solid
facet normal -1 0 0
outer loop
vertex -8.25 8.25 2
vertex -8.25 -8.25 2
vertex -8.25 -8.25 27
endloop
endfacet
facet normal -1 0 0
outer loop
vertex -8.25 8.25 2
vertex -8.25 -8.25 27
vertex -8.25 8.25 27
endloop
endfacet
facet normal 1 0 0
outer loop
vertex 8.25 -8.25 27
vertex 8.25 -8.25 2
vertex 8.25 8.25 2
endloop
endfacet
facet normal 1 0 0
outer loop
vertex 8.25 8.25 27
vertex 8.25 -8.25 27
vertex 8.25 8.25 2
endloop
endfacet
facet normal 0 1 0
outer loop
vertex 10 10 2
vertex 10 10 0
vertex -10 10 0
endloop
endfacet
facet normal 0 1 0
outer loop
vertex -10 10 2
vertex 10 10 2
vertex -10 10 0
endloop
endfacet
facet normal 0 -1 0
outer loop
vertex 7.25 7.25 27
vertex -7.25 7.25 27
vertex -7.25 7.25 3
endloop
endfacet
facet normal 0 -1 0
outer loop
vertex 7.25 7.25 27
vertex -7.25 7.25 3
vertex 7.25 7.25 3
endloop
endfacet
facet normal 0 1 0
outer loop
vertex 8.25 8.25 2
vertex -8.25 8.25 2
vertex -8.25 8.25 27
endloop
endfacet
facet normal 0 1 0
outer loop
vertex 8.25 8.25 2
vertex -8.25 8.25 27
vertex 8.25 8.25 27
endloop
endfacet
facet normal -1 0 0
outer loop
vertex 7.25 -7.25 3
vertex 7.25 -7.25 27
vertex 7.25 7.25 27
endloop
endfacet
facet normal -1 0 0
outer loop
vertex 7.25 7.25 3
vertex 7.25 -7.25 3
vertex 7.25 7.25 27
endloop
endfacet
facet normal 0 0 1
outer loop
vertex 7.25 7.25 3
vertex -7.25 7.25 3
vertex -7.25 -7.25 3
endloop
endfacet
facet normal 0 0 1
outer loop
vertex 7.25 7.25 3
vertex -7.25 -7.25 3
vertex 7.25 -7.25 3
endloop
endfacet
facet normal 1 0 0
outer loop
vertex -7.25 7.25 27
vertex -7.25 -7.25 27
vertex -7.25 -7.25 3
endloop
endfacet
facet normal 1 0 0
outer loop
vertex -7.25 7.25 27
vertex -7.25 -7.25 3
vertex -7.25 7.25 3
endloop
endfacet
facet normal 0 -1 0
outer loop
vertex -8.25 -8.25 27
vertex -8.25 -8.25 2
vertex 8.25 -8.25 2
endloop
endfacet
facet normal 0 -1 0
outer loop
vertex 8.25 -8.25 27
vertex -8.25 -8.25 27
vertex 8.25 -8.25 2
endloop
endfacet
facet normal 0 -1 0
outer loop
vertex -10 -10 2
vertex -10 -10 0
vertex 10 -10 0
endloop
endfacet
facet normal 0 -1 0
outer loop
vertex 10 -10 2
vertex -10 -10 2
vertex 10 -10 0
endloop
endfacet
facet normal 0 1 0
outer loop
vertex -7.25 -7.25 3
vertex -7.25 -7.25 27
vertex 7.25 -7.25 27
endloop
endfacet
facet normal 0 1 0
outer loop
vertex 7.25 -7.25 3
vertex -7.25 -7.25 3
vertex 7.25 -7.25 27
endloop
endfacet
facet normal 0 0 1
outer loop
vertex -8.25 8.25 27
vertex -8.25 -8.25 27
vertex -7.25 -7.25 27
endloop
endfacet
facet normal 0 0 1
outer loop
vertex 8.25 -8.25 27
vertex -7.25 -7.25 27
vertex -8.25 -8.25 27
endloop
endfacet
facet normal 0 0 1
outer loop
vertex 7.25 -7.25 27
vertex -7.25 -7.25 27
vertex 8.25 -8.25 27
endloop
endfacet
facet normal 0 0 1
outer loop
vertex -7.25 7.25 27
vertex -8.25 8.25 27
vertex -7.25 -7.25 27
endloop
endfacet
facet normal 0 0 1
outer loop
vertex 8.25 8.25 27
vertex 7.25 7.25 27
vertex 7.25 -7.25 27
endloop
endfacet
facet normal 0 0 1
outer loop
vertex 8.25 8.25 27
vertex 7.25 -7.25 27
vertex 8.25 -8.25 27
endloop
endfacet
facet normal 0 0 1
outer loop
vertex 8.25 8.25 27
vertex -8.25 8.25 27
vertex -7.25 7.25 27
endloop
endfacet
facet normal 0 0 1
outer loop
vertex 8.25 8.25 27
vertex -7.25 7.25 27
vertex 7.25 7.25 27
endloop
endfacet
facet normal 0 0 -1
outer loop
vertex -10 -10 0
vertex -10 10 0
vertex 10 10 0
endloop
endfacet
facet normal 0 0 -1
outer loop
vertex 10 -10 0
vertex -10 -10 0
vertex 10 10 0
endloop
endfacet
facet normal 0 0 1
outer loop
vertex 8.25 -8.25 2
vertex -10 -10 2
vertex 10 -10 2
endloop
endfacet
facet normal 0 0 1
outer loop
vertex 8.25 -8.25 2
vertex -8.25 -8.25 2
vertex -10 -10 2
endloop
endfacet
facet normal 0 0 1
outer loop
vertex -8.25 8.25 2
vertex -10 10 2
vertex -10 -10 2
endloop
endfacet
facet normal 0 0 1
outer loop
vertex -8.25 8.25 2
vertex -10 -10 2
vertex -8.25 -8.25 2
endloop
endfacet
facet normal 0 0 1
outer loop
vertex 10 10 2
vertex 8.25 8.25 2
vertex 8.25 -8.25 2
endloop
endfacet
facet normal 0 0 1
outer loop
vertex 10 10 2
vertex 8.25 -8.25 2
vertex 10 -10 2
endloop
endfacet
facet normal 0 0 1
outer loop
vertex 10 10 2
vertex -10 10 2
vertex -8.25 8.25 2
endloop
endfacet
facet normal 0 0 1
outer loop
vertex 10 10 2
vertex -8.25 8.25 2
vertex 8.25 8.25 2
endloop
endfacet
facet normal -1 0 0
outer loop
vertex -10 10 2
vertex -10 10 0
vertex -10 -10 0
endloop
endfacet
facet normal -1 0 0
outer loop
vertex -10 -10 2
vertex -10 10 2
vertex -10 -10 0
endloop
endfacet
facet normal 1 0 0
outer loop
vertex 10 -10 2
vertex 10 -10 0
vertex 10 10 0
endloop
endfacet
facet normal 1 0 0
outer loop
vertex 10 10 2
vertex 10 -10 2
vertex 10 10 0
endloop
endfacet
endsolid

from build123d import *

# Parameters (mm, degrees)
F1_DEPTH = 2
F2_W     = 16.5
F2_H     = 16.5
F3_DEPTH = 25
F4_W     = 14.5
F4_H     = 14.5
F5_DEPTH = 24


with BuildPart() as f1:
    # F0 (on Top) → F1 (new body)
    with BuildSketch(Plane.XY):
        Polygon((10, -10), (-10, 10), (-10, -10), align=None)
        Polygon((10, 10), (-10, 10), (10, -10), align=None)
    extrude(amount=F1_DEPTH)

    # F2 (on face) → F3 (join)
    with BuildSketch(Plane.XY.offset(2)):
        Rectangle(F2_W, F2_H)
    extrude(amount=F3_DEPTH)

    # F4 (on face) → F5 (cut)
    with BuildSketch(Plane.XY.offset(27)):
        Rectangle(F4_W, F4_H)
    extrude(amount=-F5_DEPTH, mode=Mode.SUBTRACT)


solid = f1.part
